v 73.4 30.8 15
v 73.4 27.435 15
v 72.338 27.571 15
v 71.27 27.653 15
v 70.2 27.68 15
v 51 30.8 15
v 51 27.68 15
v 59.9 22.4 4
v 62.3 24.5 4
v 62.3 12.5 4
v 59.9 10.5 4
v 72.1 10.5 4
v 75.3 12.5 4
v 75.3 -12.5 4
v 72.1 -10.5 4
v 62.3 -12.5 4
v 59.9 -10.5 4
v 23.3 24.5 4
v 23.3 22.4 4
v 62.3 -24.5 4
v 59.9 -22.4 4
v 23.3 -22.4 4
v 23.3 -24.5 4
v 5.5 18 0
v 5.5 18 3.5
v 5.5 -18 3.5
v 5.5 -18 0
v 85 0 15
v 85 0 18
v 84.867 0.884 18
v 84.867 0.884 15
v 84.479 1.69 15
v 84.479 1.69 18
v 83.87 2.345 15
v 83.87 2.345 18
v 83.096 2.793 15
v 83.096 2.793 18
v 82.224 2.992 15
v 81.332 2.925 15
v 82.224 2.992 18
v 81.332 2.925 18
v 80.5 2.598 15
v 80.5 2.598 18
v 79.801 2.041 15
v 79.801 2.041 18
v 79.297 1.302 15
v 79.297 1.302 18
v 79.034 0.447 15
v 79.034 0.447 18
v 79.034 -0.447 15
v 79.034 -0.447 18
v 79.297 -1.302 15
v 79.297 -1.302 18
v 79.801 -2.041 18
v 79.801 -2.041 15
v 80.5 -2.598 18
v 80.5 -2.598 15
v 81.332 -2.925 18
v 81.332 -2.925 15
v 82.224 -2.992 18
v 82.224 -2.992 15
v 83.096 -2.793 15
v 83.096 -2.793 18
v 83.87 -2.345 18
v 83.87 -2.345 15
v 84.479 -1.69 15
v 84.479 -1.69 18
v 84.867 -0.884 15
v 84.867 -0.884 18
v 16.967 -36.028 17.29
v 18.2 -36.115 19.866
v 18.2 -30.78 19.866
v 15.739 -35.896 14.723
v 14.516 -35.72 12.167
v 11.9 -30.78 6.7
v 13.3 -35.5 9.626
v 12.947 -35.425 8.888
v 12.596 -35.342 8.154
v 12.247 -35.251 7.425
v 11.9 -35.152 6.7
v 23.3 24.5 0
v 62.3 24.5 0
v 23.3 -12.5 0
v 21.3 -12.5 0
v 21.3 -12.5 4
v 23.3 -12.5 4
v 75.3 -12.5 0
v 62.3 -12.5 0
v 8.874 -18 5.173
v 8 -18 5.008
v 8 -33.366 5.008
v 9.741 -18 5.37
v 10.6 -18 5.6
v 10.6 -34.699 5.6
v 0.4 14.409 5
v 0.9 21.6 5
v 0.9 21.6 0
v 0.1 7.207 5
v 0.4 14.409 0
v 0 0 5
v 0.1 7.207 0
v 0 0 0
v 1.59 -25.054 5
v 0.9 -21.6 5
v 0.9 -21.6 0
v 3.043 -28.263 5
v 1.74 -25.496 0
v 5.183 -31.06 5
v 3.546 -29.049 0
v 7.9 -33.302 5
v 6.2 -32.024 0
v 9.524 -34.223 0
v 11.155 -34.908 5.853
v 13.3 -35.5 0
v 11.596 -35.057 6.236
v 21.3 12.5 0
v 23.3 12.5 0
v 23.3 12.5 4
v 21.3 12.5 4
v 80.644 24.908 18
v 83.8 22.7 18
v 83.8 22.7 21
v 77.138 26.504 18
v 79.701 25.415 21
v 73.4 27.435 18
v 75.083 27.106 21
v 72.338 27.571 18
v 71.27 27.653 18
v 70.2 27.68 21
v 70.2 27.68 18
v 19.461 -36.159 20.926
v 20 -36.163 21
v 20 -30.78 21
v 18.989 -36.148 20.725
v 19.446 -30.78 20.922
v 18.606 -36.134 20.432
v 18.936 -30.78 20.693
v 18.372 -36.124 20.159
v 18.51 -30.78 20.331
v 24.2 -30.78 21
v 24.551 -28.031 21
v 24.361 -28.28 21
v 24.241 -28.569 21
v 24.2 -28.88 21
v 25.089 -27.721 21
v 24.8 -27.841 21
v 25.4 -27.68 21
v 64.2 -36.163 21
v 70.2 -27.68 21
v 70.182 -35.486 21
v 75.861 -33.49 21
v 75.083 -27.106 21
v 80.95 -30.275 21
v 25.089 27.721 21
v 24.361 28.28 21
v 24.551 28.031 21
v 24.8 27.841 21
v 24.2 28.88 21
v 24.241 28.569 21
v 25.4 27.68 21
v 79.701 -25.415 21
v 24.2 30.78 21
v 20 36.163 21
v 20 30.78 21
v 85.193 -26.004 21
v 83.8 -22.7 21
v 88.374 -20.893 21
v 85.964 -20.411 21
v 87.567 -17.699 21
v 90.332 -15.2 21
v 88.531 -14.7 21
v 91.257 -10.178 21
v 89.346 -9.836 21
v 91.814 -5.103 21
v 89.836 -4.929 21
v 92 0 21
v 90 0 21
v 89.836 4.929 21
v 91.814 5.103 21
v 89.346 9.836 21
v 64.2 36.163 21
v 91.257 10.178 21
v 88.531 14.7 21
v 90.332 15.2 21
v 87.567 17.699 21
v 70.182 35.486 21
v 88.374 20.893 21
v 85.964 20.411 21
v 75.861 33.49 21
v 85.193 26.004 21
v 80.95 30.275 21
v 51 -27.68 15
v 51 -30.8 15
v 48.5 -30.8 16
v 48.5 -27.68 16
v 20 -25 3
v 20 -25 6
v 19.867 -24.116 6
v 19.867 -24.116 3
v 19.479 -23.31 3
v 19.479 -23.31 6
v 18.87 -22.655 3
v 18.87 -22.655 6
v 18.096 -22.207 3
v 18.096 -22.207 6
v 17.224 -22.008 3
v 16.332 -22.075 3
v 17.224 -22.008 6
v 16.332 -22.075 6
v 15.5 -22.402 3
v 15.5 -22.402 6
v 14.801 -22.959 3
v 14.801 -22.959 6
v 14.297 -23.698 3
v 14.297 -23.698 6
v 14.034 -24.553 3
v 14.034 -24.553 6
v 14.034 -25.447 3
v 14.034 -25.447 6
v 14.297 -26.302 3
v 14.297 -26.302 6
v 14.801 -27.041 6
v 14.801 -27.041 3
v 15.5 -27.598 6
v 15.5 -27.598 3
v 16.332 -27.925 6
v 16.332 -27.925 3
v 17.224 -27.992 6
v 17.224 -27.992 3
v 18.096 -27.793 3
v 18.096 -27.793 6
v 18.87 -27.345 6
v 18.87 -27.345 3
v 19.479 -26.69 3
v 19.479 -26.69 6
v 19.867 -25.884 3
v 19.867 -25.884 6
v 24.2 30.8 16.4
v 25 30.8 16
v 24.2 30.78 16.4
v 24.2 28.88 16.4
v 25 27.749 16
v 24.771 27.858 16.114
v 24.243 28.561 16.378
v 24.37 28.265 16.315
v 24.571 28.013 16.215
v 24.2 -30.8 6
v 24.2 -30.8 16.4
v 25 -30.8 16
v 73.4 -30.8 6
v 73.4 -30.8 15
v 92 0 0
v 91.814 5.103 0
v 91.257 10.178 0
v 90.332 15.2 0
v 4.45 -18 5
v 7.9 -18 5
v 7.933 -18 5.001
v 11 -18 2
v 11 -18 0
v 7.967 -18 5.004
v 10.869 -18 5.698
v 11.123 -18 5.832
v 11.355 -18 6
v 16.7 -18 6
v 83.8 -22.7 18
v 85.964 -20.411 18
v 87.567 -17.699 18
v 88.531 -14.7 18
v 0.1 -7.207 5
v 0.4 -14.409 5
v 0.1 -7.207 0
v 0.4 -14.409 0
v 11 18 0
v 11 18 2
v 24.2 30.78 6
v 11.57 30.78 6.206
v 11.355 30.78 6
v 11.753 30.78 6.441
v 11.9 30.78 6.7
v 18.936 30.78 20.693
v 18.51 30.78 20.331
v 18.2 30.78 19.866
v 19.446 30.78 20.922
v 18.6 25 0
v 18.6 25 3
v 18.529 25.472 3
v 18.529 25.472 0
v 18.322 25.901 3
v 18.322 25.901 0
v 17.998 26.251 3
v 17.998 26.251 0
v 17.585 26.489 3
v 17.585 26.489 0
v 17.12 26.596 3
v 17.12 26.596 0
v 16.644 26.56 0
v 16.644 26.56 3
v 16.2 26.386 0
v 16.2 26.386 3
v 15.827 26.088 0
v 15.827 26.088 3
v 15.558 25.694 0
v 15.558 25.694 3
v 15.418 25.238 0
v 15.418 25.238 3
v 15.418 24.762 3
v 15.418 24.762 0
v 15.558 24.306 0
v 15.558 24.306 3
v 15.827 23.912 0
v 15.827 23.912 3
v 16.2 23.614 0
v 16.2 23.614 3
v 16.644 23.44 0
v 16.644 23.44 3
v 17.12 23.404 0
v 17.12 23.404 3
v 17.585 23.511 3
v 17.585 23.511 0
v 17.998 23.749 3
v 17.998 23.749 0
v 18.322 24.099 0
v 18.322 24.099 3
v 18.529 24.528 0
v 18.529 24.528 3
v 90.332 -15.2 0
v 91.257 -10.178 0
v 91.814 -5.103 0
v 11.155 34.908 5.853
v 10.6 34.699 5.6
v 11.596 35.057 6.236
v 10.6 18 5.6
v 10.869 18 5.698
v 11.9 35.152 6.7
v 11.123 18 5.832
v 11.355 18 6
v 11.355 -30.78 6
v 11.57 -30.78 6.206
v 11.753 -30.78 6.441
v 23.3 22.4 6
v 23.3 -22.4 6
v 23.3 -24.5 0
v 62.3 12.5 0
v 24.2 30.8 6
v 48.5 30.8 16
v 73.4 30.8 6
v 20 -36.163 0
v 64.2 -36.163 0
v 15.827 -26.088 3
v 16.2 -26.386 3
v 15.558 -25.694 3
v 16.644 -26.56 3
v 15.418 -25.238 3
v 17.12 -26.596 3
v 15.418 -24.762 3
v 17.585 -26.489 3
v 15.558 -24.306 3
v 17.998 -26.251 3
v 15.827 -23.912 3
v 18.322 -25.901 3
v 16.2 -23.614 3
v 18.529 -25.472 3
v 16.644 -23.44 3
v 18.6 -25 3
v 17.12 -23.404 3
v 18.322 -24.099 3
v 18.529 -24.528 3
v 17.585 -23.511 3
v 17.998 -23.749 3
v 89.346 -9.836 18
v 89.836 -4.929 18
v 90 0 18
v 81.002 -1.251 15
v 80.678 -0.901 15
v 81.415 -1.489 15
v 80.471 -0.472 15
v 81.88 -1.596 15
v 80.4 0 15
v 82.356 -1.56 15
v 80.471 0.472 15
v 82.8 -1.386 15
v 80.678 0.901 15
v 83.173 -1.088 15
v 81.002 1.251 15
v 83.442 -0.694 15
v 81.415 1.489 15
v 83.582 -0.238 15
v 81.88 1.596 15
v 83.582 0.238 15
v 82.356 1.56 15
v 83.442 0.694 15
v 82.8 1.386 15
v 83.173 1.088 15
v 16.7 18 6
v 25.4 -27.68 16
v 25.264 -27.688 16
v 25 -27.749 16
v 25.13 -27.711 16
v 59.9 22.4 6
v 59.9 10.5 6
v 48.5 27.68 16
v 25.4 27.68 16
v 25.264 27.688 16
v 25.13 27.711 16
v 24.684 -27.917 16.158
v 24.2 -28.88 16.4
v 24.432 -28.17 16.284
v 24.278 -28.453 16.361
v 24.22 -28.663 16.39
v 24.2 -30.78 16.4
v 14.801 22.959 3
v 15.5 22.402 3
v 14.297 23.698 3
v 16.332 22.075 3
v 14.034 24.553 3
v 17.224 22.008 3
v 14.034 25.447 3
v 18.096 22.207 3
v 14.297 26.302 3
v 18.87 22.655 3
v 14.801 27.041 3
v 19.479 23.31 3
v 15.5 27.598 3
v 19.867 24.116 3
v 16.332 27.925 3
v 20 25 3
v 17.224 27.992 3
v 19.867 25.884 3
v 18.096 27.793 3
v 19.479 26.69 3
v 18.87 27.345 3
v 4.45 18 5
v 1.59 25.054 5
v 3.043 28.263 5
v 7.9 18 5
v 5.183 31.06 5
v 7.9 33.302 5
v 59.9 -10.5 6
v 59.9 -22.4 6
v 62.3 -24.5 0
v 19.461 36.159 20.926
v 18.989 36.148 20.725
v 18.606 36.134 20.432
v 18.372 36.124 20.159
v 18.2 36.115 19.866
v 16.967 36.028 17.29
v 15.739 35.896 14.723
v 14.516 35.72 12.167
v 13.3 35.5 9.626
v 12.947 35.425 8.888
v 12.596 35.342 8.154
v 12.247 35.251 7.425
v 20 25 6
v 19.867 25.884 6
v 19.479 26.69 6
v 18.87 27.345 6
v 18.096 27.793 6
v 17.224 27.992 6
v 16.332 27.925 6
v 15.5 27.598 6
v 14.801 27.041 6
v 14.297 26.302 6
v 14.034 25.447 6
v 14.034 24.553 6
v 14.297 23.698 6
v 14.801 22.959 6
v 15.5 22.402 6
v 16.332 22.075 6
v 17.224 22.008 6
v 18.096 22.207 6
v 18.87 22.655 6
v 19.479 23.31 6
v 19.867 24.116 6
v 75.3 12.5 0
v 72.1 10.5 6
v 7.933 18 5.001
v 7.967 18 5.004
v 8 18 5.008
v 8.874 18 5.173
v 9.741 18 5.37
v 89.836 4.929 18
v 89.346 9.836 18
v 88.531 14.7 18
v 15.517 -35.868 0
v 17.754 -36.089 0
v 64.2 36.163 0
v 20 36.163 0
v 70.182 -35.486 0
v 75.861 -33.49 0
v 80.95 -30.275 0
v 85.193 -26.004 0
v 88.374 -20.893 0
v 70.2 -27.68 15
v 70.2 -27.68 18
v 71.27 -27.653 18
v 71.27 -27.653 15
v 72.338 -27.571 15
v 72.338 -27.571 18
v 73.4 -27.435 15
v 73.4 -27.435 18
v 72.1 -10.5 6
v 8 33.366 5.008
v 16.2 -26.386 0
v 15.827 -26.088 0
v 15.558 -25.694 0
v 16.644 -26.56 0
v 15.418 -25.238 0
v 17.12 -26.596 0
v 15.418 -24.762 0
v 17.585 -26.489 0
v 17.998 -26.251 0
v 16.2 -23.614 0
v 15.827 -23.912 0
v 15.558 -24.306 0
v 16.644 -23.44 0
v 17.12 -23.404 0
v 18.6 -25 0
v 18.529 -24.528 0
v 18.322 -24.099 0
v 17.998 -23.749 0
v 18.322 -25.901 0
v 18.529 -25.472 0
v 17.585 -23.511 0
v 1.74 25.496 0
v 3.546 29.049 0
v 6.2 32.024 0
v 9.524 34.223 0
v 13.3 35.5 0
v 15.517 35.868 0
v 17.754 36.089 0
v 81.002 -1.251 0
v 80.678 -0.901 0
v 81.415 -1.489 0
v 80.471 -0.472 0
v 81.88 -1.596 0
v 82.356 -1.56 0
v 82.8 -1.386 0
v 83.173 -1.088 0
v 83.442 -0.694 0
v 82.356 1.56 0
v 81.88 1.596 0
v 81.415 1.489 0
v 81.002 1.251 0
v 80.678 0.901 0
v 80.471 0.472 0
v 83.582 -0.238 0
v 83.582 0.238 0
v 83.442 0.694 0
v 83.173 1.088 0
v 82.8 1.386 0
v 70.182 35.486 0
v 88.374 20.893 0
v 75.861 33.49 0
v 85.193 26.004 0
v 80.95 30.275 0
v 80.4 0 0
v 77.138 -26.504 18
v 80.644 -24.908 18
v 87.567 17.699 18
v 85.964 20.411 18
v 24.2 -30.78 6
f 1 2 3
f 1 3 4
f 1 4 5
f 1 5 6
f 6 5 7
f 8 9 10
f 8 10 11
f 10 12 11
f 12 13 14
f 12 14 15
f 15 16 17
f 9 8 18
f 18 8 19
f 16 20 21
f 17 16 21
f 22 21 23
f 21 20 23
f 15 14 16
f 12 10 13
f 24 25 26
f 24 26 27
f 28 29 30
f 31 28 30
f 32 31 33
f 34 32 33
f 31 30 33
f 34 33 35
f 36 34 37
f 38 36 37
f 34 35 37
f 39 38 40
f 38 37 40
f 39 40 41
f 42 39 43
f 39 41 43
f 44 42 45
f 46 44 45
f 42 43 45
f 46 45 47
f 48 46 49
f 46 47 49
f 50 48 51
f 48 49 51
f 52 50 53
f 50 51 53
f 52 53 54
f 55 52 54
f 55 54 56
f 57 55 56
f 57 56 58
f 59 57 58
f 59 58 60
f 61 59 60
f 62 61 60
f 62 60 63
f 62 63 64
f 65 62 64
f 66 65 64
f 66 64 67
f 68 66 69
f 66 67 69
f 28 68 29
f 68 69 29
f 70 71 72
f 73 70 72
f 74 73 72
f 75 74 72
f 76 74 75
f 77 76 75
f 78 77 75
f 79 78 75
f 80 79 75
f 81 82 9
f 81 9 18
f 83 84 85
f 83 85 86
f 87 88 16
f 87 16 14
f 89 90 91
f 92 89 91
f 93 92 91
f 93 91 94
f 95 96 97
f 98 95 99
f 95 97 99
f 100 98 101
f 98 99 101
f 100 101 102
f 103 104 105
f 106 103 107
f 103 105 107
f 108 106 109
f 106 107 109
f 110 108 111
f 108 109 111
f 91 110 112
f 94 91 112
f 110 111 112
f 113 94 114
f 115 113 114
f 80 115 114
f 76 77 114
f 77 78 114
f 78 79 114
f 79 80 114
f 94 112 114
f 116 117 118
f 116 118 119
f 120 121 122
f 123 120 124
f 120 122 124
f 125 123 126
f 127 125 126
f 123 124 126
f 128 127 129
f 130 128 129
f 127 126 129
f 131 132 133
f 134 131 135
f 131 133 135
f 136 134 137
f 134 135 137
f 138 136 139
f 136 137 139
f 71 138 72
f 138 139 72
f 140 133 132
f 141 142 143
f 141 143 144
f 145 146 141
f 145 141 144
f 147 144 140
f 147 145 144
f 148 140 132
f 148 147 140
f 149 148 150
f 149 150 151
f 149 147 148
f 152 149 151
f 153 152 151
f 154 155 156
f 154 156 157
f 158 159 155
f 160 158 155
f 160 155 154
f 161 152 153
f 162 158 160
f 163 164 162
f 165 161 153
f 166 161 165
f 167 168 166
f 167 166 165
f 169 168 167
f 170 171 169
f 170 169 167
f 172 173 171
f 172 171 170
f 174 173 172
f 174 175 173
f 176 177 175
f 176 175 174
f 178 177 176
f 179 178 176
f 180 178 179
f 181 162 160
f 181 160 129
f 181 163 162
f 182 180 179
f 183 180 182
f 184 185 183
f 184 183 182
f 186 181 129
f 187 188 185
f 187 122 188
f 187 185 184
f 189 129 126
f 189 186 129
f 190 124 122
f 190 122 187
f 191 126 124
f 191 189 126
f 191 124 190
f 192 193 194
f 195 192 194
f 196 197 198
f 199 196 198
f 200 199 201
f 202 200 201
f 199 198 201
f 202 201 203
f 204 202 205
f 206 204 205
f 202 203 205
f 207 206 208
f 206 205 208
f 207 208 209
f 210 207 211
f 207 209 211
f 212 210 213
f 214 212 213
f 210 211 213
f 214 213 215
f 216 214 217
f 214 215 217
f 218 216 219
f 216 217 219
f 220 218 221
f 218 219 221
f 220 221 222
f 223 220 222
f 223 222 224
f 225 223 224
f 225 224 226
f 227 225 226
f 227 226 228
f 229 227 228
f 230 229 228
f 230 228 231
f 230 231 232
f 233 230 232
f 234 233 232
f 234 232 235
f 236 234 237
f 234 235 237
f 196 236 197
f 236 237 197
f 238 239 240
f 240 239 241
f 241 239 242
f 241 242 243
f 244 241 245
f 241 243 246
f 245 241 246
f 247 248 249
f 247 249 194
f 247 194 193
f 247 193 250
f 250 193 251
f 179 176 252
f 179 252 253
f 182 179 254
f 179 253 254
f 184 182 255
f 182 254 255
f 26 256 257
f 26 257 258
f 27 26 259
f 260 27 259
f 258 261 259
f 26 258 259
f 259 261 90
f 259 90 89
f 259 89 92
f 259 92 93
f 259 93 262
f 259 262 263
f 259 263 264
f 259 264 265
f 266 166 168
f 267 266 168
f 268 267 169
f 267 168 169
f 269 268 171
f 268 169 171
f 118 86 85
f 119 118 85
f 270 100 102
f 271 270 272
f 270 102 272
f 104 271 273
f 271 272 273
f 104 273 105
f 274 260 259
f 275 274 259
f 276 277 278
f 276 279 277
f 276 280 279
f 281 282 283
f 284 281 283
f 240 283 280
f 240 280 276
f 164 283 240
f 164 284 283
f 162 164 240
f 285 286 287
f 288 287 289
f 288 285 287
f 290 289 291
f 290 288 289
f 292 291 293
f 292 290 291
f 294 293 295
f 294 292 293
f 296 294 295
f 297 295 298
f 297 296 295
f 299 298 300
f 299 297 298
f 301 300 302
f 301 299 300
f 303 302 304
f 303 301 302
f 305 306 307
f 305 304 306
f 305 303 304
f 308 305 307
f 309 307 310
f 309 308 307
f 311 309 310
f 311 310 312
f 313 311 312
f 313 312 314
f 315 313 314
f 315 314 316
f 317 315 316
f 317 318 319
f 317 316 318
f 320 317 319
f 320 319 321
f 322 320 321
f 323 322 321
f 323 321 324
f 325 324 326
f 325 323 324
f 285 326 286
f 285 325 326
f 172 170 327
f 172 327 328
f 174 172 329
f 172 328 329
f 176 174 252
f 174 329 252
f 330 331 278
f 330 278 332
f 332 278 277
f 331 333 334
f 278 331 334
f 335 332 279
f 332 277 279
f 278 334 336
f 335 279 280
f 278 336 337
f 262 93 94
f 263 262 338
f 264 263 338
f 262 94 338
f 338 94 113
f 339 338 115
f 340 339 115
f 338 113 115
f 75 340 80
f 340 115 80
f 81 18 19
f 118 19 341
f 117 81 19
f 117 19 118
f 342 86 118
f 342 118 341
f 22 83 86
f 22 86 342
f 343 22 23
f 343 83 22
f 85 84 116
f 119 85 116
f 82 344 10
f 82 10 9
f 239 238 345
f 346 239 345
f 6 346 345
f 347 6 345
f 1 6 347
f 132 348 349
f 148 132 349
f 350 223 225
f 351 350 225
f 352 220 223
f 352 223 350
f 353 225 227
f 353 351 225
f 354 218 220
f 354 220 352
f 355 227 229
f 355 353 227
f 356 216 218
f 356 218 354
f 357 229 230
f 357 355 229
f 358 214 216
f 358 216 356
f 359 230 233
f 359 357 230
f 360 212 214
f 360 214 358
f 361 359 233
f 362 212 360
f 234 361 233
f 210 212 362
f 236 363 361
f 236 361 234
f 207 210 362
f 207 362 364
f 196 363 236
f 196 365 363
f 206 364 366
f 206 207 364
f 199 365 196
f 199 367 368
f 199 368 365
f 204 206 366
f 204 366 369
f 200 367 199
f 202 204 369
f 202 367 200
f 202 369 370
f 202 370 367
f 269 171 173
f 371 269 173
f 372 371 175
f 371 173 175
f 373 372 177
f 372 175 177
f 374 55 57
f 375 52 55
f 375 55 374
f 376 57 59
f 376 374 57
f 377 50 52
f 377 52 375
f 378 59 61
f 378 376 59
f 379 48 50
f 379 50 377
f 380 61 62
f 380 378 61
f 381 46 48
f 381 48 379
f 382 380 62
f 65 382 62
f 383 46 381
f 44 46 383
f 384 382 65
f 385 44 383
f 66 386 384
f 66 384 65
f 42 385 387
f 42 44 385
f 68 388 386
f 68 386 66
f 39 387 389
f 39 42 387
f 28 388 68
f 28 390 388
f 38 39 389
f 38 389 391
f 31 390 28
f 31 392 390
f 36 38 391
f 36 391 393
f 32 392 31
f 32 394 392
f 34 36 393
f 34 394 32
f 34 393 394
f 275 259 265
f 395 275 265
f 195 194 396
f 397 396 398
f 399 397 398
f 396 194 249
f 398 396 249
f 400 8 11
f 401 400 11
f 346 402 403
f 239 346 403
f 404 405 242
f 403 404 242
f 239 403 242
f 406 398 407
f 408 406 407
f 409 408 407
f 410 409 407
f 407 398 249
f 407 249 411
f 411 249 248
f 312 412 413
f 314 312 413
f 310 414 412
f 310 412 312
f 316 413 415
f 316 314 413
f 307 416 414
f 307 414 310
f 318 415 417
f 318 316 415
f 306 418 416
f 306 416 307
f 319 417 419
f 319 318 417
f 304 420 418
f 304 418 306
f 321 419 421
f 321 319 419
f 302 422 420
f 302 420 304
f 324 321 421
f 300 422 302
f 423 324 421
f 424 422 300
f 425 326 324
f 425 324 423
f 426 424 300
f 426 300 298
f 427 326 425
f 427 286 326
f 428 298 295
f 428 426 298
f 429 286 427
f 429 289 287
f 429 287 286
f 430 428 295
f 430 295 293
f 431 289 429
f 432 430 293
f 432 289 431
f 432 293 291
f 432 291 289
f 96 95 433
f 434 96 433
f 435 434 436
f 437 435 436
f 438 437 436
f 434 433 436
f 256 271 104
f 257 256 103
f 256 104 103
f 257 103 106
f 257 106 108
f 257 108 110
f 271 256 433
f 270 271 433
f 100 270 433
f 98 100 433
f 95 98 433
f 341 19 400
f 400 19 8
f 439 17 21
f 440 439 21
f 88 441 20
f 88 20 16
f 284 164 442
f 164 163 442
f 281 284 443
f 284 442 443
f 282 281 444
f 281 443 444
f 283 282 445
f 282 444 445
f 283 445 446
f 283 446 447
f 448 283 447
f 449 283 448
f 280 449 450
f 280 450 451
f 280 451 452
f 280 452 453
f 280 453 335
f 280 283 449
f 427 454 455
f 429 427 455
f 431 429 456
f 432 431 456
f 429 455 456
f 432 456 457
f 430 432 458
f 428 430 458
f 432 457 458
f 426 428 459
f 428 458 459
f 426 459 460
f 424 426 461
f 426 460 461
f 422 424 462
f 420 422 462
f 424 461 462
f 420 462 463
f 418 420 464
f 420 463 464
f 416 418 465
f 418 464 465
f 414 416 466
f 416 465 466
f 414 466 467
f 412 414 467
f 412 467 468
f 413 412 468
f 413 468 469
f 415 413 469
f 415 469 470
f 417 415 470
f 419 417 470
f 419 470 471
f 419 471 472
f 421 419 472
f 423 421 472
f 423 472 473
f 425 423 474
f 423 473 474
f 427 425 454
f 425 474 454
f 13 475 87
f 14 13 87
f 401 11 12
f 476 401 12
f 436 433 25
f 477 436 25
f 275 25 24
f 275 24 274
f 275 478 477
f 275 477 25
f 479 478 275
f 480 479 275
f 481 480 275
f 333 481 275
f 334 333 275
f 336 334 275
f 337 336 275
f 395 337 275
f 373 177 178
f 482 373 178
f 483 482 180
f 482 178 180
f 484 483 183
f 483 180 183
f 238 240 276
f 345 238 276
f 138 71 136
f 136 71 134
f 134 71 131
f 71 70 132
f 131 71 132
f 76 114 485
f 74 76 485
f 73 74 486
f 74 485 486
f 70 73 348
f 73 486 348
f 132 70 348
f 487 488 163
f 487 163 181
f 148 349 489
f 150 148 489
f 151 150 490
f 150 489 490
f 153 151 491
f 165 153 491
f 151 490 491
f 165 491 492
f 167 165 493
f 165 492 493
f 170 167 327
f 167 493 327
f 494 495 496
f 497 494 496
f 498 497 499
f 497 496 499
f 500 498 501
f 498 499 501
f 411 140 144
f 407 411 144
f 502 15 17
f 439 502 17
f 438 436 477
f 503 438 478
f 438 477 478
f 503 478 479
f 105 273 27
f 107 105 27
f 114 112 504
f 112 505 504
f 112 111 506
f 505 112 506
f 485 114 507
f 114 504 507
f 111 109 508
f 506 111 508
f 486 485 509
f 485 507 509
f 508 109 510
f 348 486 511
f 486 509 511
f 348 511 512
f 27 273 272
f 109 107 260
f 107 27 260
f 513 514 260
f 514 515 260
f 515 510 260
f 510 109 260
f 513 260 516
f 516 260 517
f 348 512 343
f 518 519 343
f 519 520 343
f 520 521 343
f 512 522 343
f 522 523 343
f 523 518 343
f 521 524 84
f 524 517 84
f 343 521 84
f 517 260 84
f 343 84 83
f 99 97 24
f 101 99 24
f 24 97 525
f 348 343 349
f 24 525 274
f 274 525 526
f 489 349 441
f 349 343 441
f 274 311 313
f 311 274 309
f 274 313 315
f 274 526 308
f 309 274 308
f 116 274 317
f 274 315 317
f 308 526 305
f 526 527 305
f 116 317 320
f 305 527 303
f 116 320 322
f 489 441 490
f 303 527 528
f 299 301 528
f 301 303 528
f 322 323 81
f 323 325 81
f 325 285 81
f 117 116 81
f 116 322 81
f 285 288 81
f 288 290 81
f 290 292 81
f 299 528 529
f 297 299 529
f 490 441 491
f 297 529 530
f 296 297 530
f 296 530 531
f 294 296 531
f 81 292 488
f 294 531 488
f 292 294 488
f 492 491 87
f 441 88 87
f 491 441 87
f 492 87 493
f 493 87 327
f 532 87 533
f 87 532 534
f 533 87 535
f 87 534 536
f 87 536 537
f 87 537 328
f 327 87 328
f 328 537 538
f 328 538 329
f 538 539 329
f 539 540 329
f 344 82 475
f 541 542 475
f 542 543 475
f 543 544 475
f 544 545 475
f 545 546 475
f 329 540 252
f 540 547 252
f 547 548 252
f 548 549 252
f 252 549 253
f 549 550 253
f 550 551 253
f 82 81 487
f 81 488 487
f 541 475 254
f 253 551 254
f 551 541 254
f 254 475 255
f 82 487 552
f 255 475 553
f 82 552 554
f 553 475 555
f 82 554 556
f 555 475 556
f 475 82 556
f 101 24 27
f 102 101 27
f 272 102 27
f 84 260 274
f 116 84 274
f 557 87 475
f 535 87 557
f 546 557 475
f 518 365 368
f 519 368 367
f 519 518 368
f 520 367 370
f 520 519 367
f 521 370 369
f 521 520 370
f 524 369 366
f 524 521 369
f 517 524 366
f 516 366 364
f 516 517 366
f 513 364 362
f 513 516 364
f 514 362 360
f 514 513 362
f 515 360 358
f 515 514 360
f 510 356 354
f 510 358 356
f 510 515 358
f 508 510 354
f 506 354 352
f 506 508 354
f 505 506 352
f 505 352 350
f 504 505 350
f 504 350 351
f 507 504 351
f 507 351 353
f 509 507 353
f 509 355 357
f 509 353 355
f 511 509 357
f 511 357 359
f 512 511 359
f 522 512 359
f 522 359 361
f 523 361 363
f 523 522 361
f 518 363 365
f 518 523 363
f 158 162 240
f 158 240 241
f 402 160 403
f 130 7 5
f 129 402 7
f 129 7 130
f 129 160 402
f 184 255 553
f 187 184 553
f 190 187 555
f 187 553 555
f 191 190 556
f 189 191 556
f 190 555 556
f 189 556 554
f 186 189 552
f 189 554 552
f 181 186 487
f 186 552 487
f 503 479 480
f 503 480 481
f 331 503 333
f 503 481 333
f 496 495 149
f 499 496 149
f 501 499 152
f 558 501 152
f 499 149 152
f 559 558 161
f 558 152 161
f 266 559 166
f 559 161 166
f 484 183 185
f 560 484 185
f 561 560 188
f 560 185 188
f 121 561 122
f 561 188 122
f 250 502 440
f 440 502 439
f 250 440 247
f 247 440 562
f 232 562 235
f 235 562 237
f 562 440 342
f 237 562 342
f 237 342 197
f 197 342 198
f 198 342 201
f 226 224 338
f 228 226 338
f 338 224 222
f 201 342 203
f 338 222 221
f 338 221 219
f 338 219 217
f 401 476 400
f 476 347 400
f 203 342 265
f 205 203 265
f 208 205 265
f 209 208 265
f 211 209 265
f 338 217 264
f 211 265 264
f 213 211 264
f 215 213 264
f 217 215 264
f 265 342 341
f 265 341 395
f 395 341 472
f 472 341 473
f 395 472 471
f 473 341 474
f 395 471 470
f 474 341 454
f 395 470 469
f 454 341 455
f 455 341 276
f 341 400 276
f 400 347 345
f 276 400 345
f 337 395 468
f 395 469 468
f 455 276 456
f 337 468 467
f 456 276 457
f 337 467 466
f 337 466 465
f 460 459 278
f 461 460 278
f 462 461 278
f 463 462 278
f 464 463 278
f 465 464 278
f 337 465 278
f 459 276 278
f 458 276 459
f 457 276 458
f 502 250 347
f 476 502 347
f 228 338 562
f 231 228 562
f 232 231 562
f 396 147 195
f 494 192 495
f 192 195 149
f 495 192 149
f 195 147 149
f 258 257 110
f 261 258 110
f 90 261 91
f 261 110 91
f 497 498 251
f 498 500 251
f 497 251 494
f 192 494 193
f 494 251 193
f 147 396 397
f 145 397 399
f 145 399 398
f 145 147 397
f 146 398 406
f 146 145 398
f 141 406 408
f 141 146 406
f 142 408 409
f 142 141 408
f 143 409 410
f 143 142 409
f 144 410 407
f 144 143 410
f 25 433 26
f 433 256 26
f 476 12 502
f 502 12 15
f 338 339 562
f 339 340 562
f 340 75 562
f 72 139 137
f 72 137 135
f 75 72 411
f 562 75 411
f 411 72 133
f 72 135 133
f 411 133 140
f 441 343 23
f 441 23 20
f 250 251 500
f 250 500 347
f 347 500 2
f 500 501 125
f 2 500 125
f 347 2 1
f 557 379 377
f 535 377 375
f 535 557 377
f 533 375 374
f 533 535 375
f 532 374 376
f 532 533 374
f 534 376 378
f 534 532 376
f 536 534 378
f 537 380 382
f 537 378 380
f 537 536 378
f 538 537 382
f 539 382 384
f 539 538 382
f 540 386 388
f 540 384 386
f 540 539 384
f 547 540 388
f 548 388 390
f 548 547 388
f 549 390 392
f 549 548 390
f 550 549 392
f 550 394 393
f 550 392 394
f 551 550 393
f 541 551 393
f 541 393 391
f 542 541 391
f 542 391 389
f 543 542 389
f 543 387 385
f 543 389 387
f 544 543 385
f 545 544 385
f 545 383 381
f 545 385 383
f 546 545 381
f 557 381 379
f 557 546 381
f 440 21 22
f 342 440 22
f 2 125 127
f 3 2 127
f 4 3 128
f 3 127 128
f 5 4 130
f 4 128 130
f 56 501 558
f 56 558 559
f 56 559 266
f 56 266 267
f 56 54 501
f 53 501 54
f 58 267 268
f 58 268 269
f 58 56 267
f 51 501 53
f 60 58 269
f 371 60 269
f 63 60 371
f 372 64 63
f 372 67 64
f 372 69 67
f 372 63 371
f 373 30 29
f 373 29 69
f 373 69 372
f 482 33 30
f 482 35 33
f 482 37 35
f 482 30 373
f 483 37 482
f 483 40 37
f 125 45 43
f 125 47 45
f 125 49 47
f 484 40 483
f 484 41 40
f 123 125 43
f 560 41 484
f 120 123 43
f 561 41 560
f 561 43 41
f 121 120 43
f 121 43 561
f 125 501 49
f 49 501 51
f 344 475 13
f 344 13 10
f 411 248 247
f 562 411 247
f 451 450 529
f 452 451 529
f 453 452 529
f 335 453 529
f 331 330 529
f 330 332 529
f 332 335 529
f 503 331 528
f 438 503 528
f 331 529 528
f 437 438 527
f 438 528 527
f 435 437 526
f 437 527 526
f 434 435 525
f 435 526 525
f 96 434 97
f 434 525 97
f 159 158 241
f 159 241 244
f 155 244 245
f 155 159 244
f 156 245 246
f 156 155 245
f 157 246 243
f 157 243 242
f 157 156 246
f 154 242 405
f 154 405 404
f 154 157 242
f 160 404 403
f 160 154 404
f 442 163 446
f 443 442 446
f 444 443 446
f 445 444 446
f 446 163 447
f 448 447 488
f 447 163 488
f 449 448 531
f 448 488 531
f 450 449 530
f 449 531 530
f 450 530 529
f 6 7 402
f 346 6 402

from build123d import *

# Parameters (mm, degrees)
SKETCH_R          = 1.6
PAD_DEPTH         = 21
POCKET_DEPTH      = 36.1638711749
POCKET_DEPTH_BACK = 36.1638711749
POCKET001_DEPTH   = 3
POCKET002_DEPTH   = 12
SKETCH004_R       = 3
POCKET003_DEPTH   = 3
SKETCH005_R       = 3
POCKET004_DEPTH   = 3
POCKET005_DEPTH   = 30.8
POCKET006_DEPTH   = 4
POCKET007_DEPTH   = 18


with BuildPart() as part:
    # Sketch → Pad (new body)
    with BuildSketch(Plane.XY):
        with BuildLine():
            ThreePointArc((0.9, 21.6), (0.2250976252, 10.8093709323), (0, 0))
            ThreePointArc((0, 0), (0.2250976252, -10.8093709323), (0.9, -21.6))
            ThreePointArc((0.9, -21.6), (4.7770016669, -30.6223150598), (13.3, -35.5))
            ThreePointArc((13.3, -35.5), (16.6336444708, -35.9967498287), (20, -36.1628711749))
            Line((20, -36.1628711749), (64.2, -36.1628711749))
            ThreePointArc((64.2, -36.1628711749), (80.950441462, -30.2745268069), (90.3317276275, -15.2))
            ThreePointArc((90.3317276275, -15.2), (91.5816834036, -7.6456381799), (92, 0))
            ThreePointArc((92, 0), (91.5816834036, 7.6456381799), (90.3317276275, 15.2))
            ThreePointArc((90.3317276275, 15.2), (80.950441462, 30.2745268069), (64.2, 36.1628711749))
            Line((20, 36.1628711749), (64.2, 36.1628711749))
            ThreePointArc((20, 36.1628711749), (16.6336444708, 35.9967498287), (13.3, 35.5))
            ThreePointArc((13.3, 35.5), (4.7770016669, 30.6223150598), (0.9, 21.6))
        make_face()
        with Locations((17, 25)):
            Circle(SKETCH_R, mode=Mode.SUBTRACT)
        with Locations((17, -25)):
            Circle(SKETCH_R, mode=Mode.SUBTRACT)
        with BuildLine():
            ThreePointArc((83.6, 0), (82, 1.6), (80.4, 0))
            ThreePointArc((80.4, 0), (82, -1.6), (83.6, 0))
        make_face(mode=Mode.SUBTRACT)
        Polygon((23.3, 0), (23.3, 22.4), (59.9, 22.4), (59.9, 10.5), (72.1, 10.5), (72.1, 0), (72.1, -10.5), (59.9, -10.5), (59.9, -22.4), (23.3, -22.4), align=None, mode=Mode.SUBTRACT)
    extrude(amount=PAD_DEPTH)

    # Sketch001 → Pocket (cut, two sides)
    with BuildSketch(Plane.XZ) as pocket_sk:
        with BuildLine():
            Line((0, 5), (0, 21))
            Line((0, 21), (20, 21))
            ThreePointArc((20, 21), (18.9362470202, 20.6928206855), (18.2, 19.8658564429))
            Line((18.2, 19.8658564429), (11.9, 6.7))
            ThreePointArc((10.6, 5.6), (11.3678698195, 6.0106993043), (11.9, 6.7))
            ThreePointArc((8, 5.008391541), (9.3083281759, 5.267595115), (10.6, 5.6))
            ThreePointArc((7.9, 5), (7.9501757361, 5.0021015655), (8, 5.008391541))
            Line((0, 5), (7.9, 5))
        make_face()
    extrude(amount=-POCKET_DEPTH, mode=Mode.SUBTRACT)
    extrude(pocket_sk.sketch, amount=POCKET_DEPTH_BACK, mode=Mode.SUBTRACT)

    # Sketch002 (on Face34 of Pocket) → Pocket001 (cut)
    with BuildSketch(Plane.XY.offset(21)):
        with BuildLine():
            Line((24.2, 30.78), (0, 30.78))
            Line((0, 0), (0, 30.78))
            Line((0, 0), (0, -30.78))
            Line((24.2, -30.78), (0, -30.78))
            Line((24.2, -30.78), (24.2, -28.88))
            ThreePointArc((25.4, -27.68), (24.5514718626, -28.0314718626), (24.2, -28.88))
            Line((25.4, -27.68), (70.2, -27.68))
            ThreePointArc((70.2, -27.68), (77.4415537007, -26.3958494637), (83.8, -22.7))
            ThreePointArc((83.8, -22.7), (86.8411272784, -19.0996370304), (88.5305835924, -14.7))
            ThreePointArc((88.5305835924, -14.7), (89.6317327981, -7.3866295524), (90, 0))
            ThreePointArc((90, 0), (89.6317327981, 7.3866295524), (88.5305835924, 14.7))
            ThreePointArc((88.5305835924, 14.7), (86.8411272784, 19.0996370304), (83.8, 22.7))
            ThreePointArc((83.8, 22.7), (77.4415537007, 26.3958494637), (70.2, 27.68))
            Line((25.4, 27.68), (70.2, 27.68))
            ThreePointArc((24.2, 28.88), (24.5514718626, 28.0314718626), (25.4, 27.68))
            Line((24.2, 30.78), (24.2, 28.88))
        make_face()
    extrude(amount=-POCKET001_DEPTH, mode=Mode.SUBTRACT)

    # Sketch003 (on Face35 of Pocket001) → Pocket002 (cut)
    with BuildSketch(Plane.XY.offset(18)):
        with BuildLine():
            Line((0, 0), (0, 30.78))
            Line((0, 30.78), (24.2, 30.78))
            Line((24.2, 28.88), (24.2, 30.78))
            ThreePointArc((24.2, 28.88), (24.5514718626, 28.0314718626), (25.4, 27.68))
            Line((25.4, 27.68), (70.2, 27.68))
            ThreePointArc((73.4, 27.4354687069), (71.8046647277, 27.6187781914), (70.2, 27.68))
            Line((73.4, 27.4354687069), (73.4, 0))
            Line((73.4, -27.4354687069), (73.4, 0))
            ThreePointArc((70.2, -27.68), (71.8046647277, -27.6187781914), (73.4, -27.4354687069))
            Line((25.4, -27.68), (70.2, -27.68))
            ThreePointArc((25.4, -27.68), (24.5514718626, -28.0314718626), (24.2, -28.88))
            Line((24.2, -28.88), (24.2, -30.78))
            Line((0, -30.78), (24.2, -30.78))
            Line((0, 0), (0, -30.78))
        make_face()
    extrude(amount=-POCKET002_DEPTH, mode=Mode.SUBTRACT)

    # Sketch004 (on Face39 of Pocket002) → Pocket003 (cut)
    with BuildSketch(Plane.XY.offset(6)):
        with Locations((17, 25)):
            Circle(SKETCH004_R)
        with Locations((17, -25)):
            Circle(SKETCH004_R)
    extrude(amount=-POCKET003_DEPTH, mode=Mode.SUBTRACT)

    # Sketch005 (on Face42 of Pocket003) → Pocket004 (cut)
    with BuildSketch(Plane.XY.offset(18)):
        with Locations((82, 0)):
            Circle(SKETCH005_R)
    extrude(amount=-POCKET004_DEPTH, mode=Mode.SUBTRACT)

    # Sketch006 → Pocket005 (cut, symmetric)
    with BuildSketch(Plane.XZ):
        Polygon((73.4, 15), (51, 15), (48.5, 16), (25, 16), (24.2, 16.4), (24.2, 6), (73.4, 6), align=None)
    extrude(amount=POCKET005_DEPTH, both=True, mode=Mode.SUBTRACT)

    # Sketch007 (on Face2 of Pocket005) → Pocket006 (cut)
    with BuildSketch(Plane(origin=(0, 0, 0), x_dir=(1, 0, 0), z_dir=(0, 0, -1))):
        Polygon((21.3, 0), (21.3, 12.5), (23.3, 12.5), (23.3, 24.5), (62.3, 24.5), (62.3, 12.5), (75.3, 12.5), (75.3, 0), (75.3, -12.5), (62.3, -12.5), (62.3, -24.5), (23.3, -24.5), (23.3, -12.5), (21.3, -12.5), align=None)
    extrude(amount=-POCKET006_DEPTH, mode=Mode.SUBTRACT)

    # Sketch008 → Pocket007 (cut, symmetric)
    with BuildSketch(Plane.XZ):
        Polygon((5.5, 0), (11, 0), (11, 2), (16.7, 6), (4.45, 6), (4.45, 5), (5.5, 3.5), align=None)
    extrude(amount=POCKET007_DEPTH, both=True, mode=Mode.SUBTRACT)


solid = part.part
